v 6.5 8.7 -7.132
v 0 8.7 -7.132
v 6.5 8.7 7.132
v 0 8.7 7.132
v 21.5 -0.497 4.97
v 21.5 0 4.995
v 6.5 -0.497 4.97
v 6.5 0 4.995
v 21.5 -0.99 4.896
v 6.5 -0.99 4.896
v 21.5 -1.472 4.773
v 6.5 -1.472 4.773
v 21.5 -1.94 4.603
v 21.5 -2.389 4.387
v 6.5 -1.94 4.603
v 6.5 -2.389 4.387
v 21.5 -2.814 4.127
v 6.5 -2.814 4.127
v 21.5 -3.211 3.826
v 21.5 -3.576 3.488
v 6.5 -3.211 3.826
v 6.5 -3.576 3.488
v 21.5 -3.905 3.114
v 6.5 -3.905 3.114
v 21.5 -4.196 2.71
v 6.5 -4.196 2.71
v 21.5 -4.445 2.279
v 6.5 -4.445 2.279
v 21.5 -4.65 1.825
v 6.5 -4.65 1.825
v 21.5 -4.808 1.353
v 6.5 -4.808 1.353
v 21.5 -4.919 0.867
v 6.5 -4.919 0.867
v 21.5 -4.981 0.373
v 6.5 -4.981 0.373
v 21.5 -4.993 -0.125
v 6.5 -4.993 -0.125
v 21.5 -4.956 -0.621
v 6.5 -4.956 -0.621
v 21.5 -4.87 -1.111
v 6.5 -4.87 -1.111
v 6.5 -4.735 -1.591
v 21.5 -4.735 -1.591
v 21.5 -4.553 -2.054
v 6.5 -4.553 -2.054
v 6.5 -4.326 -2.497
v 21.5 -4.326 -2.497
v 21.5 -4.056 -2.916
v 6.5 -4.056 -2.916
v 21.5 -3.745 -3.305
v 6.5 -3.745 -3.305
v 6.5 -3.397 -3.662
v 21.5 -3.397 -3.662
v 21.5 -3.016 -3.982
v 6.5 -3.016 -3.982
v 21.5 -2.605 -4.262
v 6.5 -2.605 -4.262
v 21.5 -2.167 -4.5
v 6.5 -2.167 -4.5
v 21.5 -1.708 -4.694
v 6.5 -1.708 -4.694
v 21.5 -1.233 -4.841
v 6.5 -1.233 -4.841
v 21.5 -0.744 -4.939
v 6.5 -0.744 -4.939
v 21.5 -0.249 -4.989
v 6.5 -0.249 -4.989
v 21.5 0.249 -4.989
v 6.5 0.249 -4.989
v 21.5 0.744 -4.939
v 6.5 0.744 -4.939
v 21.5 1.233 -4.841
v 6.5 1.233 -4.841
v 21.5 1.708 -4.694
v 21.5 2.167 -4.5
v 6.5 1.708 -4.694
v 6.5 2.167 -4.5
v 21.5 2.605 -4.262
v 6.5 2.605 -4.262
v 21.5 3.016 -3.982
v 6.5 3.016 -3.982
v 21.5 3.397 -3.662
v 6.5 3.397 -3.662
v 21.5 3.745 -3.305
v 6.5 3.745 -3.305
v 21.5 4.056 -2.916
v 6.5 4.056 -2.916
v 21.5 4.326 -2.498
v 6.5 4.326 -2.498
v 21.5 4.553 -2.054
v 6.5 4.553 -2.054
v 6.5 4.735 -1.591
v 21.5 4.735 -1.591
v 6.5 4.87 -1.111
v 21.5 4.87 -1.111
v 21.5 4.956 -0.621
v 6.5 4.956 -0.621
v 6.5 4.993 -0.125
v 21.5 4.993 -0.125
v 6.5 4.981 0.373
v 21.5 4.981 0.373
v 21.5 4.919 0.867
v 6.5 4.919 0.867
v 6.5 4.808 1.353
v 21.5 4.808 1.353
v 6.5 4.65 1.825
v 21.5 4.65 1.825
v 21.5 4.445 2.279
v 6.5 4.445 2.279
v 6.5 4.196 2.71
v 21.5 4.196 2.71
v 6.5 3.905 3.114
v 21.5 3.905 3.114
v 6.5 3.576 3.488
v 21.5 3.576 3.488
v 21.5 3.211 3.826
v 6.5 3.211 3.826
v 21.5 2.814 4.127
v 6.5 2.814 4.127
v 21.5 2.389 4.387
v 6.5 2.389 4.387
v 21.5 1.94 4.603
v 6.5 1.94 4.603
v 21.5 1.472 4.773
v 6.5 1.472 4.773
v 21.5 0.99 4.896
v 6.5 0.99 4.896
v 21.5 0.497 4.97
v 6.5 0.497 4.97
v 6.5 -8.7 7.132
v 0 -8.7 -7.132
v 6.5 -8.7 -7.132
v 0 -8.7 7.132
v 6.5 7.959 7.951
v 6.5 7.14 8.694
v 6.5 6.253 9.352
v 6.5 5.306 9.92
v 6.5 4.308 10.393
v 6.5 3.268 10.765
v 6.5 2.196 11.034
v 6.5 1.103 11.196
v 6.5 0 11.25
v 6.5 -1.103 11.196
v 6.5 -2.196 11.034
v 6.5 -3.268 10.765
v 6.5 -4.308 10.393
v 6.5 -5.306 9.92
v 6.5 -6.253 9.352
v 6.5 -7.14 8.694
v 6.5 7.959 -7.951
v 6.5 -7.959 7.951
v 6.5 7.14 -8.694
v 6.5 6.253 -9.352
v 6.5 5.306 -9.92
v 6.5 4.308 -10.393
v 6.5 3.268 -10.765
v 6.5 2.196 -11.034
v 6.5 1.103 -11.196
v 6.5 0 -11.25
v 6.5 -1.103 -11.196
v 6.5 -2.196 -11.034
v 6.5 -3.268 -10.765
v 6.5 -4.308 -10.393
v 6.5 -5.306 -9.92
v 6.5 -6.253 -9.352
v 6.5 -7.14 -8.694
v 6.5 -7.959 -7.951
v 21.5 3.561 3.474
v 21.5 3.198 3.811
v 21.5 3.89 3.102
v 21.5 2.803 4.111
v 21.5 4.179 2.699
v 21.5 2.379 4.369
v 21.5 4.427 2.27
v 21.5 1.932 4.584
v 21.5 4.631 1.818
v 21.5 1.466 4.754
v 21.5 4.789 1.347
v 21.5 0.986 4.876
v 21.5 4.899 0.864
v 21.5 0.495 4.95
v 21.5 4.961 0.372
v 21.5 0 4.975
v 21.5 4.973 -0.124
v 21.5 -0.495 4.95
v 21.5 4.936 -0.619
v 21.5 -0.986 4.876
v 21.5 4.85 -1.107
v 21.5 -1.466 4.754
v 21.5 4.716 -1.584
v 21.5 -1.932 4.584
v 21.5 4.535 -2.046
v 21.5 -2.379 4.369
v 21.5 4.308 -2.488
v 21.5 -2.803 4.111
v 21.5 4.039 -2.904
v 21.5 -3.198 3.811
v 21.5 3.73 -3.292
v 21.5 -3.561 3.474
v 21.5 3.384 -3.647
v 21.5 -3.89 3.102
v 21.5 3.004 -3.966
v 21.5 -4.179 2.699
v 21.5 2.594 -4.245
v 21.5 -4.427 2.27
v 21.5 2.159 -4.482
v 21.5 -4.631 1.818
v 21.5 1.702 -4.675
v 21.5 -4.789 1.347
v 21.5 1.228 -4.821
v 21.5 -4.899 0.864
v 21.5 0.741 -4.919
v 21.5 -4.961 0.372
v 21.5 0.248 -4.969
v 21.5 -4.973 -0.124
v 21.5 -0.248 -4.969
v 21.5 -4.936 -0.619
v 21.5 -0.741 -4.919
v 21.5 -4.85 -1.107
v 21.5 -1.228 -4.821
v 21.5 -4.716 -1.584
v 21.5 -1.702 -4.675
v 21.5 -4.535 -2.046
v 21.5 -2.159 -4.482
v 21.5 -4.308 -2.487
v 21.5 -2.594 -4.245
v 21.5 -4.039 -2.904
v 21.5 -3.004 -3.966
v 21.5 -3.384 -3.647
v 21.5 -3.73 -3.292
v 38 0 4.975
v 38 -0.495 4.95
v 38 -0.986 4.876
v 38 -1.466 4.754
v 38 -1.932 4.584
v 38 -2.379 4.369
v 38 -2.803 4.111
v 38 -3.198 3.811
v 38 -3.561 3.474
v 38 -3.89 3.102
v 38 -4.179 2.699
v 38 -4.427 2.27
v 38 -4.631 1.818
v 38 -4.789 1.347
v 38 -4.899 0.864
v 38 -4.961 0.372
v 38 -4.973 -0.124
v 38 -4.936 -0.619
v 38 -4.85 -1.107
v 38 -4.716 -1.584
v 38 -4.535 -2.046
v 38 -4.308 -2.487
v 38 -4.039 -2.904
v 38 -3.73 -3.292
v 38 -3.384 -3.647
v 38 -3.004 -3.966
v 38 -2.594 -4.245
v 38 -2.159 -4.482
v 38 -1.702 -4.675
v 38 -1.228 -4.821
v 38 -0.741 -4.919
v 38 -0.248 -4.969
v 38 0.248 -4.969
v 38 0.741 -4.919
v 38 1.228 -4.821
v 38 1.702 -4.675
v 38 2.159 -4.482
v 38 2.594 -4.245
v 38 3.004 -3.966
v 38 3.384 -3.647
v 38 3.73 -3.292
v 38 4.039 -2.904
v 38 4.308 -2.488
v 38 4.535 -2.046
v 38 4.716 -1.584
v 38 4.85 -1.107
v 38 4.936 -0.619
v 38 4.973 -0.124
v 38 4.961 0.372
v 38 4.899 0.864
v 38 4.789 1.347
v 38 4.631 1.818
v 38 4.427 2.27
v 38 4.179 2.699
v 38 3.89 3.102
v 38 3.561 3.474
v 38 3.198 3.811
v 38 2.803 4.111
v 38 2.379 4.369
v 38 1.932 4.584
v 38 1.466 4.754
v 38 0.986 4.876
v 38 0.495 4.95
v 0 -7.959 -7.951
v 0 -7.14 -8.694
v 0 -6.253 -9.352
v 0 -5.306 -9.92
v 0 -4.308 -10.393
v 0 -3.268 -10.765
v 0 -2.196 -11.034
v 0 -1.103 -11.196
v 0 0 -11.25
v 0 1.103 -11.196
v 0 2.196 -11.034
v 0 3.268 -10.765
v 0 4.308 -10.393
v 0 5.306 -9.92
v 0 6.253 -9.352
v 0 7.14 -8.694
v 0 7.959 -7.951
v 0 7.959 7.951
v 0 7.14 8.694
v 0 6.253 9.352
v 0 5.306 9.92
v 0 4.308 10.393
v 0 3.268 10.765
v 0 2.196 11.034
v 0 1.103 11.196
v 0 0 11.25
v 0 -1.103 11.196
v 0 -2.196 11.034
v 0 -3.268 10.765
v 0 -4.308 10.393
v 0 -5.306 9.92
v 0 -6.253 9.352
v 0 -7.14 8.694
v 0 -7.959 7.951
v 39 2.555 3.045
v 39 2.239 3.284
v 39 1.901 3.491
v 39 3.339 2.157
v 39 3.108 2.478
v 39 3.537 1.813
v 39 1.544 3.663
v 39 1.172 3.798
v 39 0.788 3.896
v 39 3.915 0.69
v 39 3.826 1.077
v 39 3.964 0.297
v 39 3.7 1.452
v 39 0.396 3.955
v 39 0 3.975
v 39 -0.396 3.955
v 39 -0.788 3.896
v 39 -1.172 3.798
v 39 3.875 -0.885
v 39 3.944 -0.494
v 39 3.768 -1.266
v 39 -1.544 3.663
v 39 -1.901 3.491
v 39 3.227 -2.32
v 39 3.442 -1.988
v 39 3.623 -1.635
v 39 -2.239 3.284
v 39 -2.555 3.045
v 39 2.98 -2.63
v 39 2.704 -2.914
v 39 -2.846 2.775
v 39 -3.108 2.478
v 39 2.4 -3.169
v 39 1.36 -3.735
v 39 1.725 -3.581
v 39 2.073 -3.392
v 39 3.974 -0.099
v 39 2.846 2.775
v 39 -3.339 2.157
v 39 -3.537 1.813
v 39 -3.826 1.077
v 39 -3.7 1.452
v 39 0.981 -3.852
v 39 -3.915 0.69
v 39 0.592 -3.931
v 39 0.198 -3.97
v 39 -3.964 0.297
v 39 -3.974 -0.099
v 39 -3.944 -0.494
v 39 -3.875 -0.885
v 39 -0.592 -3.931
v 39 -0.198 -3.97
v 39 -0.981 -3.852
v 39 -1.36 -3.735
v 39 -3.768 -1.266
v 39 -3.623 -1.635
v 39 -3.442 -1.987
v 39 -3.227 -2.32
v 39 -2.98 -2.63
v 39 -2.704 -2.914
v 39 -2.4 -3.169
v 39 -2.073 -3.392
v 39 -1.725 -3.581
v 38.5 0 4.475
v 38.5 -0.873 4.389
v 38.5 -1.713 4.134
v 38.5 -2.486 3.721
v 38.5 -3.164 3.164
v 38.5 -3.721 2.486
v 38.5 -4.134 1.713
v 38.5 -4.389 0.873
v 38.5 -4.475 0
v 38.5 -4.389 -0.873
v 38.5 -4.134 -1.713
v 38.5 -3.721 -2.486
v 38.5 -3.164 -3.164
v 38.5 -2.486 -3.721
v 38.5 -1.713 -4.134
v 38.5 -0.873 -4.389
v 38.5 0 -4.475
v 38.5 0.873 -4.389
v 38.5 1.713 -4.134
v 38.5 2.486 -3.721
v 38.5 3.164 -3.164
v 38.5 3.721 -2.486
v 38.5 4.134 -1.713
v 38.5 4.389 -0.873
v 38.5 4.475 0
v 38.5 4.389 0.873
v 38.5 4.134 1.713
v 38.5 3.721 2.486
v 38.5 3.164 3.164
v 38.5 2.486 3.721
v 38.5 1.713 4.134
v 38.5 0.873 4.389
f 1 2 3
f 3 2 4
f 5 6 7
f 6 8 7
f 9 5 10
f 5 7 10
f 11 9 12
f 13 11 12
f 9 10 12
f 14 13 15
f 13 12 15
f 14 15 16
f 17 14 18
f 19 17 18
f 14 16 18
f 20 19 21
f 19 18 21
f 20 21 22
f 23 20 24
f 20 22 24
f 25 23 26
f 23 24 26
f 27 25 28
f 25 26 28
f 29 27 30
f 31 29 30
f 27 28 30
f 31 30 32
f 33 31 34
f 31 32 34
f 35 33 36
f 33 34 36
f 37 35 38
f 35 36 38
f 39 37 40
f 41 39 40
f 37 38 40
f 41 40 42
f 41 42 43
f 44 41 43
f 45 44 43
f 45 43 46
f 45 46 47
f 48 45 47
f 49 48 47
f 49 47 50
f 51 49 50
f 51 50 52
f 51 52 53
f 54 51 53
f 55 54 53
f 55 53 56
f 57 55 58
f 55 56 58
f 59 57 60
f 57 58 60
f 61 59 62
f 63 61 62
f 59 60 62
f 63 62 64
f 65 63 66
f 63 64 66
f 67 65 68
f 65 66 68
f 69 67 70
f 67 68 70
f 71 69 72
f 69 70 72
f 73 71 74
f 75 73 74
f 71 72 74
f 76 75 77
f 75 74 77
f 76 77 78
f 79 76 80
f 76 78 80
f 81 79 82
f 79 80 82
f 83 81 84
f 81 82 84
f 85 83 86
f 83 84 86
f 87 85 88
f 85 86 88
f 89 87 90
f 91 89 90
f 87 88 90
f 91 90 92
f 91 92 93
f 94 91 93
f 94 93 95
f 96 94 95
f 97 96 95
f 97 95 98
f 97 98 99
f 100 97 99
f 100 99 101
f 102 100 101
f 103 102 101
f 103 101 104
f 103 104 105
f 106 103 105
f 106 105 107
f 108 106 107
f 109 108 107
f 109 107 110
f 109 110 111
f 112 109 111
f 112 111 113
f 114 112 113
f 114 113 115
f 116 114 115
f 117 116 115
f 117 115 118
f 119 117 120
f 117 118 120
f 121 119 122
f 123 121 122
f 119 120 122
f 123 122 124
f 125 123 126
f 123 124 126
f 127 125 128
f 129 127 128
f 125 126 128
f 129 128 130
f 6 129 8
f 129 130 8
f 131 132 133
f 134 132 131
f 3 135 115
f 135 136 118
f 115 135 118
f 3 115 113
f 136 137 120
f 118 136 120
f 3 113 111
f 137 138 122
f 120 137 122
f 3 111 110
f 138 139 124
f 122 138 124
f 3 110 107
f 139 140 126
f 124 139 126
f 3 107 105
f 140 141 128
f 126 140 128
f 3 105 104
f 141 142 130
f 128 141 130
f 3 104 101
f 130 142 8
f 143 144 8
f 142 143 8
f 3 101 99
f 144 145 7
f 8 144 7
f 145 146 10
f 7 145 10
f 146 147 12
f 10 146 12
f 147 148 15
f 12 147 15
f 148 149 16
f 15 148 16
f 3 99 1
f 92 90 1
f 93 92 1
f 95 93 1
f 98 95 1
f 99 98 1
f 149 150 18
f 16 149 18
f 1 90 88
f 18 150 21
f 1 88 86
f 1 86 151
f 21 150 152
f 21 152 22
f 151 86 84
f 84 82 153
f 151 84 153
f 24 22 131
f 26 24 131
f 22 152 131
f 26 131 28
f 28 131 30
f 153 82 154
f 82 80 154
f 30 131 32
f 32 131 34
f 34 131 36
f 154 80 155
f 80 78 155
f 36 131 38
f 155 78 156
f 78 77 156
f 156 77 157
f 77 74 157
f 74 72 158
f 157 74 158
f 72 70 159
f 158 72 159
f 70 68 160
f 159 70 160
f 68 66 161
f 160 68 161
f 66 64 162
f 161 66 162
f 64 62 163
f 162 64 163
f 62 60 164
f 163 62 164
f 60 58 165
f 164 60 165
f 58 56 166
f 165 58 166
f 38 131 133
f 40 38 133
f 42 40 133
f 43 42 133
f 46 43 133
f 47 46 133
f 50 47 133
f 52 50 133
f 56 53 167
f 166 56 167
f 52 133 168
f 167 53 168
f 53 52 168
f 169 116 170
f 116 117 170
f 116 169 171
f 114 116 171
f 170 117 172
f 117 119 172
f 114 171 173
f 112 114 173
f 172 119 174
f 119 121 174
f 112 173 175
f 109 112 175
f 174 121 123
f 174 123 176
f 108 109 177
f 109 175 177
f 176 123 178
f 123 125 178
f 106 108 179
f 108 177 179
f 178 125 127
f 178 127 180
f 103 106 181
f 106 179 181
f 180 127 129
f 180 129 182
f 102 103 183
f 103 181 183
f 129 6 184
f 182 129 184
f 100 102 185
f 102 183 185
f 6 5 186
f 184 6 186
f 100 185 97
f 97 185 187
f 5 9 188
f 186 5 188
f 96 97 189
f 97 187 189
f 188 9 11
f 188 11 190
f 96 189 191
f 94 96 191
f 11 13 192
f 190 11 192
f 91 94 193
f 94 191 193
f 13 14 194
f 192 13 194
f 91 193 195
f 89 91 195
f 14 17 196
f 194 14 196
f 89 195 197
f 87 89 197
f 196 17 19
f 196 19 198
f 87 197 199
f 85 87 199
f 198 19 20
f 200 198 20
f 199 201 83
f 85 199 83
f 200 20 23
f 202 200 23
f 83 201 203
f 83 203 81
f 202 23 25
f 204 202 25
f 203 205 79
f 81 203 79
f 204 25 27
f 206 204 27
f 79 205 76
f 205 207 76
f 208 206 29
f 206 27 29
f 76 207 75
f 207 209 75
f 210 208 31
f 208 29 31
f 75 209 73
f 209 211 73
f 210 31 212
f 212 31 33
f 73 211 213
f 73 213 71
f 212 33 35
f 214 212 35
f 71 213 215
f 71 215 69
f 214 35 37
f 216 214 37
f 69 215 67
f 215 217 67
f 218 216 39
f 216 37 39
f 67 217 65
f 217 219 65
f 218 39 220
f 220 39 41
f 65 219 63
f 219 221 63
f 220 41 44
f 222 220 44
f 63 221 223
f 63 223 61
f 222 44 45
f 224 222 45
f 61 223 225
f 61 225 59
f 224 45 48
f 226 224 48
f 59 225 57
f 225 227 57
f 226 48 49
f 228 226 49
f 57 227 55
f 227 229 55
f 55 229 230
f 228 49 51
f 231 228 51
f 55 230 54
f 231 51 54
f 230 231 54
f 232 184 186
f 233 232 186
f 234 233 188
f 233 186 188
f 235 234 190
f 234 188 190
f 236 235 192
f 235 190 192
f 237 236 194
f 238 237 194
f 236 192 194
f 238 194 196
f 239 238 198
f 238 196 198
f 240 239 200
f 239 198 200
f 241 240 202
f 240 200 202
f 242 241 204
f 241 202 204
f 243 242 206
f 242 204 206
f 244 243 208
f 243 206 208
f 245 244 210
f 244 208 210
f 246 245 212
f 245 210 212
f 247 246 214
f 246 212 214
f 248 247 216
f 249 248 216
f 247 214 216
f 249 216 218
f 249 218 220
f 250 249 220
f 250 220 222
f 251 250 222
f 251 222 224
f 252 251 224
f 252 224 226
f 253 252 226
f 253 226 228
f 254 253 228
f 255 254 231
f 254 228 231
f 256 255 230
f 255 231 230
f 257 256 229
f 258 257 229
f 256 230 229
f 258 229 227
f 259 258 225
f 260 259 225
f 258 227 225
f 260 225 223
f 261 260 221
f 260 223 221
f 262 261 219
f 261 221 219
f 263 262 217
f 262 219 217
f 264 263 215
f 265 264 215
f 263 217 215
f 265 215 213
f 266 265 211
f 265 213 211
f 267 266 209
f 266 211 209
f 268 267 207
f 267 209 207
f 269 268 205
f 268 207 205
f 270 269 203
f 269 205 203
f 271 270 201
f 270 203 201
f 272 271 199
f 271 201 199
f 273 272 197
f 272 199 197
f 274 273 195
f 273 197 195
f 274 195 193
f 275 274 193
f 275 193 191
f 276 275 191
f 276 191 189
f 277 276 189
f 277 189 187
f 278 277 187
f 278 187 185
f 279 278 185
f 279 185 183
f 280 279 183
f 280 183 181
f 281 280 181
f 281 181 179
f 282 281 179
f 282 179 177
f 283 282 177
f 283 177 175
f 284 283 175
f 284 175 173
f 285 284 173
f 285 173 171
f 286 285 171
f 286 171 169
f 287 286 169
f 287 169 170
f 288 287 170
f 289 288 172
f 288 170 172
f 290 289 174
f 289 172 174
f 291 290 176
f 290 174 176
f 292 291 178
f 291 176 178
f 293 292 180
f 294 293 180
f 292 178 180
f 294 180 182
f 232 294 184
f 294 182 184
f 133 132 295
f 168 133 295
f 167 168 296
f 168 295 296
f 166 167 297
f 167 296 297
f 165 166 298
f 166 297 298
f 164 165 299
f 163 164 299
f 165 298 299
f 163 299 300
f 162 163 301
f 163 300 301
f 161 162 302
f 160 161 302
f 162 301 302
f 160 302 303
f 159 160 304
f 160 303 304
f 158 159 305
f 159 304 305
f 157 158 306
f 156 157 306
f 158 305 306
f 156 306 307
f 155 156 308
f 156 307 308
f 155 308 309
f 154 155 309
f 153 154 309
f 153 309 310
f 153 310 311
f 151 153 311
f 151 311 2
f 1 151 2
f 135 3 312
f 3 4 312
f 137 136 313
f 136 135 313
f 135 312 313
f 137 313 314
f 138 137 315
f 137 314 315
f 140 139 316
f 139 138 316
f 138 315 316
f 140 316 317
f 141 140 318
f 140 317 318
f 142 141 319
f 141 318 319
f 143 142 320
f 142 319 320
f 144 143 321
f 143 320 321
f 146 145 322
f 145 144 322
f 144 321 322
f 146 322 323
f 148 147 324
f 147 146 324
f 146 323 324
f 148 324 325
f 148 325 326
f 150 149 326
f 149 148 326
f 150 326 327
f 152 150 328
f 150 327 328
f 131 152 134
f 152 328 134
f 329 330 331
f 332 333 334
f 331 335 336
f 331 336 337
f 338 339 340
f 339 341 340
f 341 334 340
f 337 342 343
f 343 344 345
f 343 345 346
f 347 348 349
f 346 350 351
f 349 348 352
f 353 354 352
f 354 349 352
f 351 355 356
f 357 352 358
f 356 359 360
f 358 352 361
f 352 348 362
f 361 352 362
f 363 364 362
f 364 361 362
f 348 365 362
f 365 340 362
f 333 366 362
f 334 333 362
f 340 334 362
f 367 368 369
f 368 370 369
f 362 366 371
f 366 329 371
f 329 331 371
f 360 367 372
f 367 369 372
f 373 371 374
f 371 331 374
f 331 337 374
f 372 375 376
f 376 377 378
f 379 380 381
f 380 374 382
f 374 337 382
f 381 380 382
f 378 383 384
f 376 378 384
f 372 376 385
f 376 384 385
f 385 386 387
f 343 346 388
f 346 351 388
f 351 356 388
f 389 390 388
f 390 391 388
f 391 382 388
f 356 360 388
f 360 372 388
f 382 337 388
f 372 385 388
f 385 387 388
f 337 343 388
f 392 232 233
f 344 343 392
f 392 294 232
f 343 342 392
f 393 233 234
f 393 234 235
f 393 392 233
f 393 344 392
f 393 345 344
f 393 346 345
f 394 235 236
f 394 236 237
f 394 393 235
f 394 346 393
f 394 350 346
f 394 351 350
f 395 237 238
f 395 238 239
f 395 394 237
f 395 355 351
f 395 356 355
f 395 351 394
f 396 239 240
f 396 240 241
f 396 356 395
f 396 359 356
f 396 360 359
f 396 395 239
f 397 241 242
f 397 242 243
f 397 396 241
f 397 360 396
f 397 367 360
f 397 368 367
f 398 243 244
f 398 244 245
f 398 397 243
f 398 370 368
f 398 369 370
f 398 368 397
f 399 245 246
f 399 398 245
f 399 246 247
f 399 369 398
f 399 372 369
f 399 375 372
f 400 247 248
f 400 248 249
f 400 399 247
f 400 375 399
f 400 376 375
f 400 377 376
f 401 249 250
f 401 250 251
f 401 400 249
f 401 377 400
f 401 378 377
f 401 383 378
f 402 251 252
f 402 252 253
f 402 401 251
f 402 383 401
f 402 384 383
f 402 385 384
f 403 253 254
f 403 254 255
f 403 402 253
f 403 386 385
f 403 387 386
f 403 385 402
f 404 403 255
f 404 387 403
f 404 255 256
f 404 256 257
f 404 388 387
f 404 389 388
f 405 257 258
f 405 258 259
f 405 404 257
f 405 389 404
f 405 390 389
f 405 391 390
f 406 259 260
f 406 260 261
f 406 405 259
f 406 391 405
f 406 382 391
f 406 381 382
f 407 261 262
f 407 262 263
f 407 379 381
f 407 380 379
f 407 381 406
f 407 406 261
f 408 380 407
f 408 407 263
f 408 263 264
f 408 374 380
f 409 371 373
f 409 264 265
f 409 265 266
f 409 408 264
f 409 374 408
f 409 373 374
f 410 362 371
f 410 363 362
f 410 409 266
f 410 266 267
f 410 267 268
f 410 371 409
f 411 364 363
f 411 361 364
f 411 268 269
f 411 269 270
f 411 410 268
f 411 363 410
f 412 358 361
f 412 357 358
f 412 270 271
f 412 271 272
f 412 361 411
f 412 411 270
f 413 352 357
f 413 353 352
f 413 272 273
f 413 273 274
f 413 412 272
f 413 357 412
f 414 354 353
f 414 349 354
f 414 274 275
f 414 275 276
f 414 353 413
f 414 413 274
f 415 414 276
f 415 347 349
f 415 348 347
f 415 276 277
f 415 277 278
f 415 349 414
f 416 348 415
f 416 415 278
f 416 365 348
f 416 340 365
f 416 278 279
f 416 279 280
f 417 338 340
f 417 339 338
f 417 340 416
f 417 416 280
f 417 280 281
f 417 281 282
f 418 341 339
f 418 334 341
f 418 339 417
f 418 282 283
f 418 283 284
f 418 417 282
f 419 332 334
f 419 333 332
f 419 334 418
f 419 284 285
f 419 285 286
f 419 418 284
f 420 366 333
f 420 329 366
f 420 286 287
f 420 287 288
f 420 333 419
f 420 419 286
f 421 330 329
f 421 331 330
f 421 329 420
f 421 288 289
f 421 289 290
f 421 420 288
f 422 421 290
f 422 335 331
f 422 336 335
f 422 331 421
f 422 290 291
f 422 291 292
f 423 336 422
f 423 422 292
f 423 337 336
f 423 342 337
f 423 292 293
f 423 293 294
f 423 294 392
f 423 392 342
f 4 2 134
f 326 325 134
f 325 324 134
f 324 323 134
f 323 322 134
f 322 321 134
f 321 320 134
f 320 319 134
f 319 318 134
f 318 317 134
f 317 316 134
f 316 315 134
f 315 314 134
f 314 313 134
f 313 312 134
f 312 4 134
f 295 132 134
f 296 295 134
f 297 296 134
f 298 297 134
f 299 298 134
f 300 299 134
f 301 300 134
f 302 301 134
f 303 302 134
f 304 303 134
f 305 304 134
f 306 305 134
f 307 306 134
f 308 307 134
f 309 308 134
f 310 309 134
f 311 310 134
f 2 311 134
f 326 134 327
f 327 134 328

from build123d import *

# Parameters (mm, degrees)
F2_W     = 2.55
F2_H     = 14.264992
F3_DEPTH = 6.5
F4_SIZE  = 1


with BuildPart() as f1:
    # F0 (on Front) → F1 (revolve)
    with BuildSketch(Plane.XZ):
        Polygon((0, 11.25), (0, 0), (39, 0), (39, 4.975), (21.5, 4.975), (21.5, 4.995), (6.5, 4.995), (6.5, 11.25), align=None)
    revolve(axis=Axis((19.5, 0, 0), (1, 0, 0)))

    # F2 (on face) → F3 (cut, through all)
    with BuildSketch(Plane(origin=(0, 0, 0), x_dir=(0, -1, 0), z_dir=(-1, 0, 0))):
        with Locations((-9.975, 0)):
            Rectangle(F2_W, F2_H)
        with Locations((9.975, 0)):
            Rectangle(F2_W, F2_H)
    extrude(amount=-F3_DEPTH, mode=Mode.SUBTRACT)

    # F4
    f4_edges = [f1.edges().sort_by_distance(p)[0] for p in [
        (39, 0, -4.975),
    ]]
    chamfer(f4_edges, length=F4_SIZE)


solid = f1.part
